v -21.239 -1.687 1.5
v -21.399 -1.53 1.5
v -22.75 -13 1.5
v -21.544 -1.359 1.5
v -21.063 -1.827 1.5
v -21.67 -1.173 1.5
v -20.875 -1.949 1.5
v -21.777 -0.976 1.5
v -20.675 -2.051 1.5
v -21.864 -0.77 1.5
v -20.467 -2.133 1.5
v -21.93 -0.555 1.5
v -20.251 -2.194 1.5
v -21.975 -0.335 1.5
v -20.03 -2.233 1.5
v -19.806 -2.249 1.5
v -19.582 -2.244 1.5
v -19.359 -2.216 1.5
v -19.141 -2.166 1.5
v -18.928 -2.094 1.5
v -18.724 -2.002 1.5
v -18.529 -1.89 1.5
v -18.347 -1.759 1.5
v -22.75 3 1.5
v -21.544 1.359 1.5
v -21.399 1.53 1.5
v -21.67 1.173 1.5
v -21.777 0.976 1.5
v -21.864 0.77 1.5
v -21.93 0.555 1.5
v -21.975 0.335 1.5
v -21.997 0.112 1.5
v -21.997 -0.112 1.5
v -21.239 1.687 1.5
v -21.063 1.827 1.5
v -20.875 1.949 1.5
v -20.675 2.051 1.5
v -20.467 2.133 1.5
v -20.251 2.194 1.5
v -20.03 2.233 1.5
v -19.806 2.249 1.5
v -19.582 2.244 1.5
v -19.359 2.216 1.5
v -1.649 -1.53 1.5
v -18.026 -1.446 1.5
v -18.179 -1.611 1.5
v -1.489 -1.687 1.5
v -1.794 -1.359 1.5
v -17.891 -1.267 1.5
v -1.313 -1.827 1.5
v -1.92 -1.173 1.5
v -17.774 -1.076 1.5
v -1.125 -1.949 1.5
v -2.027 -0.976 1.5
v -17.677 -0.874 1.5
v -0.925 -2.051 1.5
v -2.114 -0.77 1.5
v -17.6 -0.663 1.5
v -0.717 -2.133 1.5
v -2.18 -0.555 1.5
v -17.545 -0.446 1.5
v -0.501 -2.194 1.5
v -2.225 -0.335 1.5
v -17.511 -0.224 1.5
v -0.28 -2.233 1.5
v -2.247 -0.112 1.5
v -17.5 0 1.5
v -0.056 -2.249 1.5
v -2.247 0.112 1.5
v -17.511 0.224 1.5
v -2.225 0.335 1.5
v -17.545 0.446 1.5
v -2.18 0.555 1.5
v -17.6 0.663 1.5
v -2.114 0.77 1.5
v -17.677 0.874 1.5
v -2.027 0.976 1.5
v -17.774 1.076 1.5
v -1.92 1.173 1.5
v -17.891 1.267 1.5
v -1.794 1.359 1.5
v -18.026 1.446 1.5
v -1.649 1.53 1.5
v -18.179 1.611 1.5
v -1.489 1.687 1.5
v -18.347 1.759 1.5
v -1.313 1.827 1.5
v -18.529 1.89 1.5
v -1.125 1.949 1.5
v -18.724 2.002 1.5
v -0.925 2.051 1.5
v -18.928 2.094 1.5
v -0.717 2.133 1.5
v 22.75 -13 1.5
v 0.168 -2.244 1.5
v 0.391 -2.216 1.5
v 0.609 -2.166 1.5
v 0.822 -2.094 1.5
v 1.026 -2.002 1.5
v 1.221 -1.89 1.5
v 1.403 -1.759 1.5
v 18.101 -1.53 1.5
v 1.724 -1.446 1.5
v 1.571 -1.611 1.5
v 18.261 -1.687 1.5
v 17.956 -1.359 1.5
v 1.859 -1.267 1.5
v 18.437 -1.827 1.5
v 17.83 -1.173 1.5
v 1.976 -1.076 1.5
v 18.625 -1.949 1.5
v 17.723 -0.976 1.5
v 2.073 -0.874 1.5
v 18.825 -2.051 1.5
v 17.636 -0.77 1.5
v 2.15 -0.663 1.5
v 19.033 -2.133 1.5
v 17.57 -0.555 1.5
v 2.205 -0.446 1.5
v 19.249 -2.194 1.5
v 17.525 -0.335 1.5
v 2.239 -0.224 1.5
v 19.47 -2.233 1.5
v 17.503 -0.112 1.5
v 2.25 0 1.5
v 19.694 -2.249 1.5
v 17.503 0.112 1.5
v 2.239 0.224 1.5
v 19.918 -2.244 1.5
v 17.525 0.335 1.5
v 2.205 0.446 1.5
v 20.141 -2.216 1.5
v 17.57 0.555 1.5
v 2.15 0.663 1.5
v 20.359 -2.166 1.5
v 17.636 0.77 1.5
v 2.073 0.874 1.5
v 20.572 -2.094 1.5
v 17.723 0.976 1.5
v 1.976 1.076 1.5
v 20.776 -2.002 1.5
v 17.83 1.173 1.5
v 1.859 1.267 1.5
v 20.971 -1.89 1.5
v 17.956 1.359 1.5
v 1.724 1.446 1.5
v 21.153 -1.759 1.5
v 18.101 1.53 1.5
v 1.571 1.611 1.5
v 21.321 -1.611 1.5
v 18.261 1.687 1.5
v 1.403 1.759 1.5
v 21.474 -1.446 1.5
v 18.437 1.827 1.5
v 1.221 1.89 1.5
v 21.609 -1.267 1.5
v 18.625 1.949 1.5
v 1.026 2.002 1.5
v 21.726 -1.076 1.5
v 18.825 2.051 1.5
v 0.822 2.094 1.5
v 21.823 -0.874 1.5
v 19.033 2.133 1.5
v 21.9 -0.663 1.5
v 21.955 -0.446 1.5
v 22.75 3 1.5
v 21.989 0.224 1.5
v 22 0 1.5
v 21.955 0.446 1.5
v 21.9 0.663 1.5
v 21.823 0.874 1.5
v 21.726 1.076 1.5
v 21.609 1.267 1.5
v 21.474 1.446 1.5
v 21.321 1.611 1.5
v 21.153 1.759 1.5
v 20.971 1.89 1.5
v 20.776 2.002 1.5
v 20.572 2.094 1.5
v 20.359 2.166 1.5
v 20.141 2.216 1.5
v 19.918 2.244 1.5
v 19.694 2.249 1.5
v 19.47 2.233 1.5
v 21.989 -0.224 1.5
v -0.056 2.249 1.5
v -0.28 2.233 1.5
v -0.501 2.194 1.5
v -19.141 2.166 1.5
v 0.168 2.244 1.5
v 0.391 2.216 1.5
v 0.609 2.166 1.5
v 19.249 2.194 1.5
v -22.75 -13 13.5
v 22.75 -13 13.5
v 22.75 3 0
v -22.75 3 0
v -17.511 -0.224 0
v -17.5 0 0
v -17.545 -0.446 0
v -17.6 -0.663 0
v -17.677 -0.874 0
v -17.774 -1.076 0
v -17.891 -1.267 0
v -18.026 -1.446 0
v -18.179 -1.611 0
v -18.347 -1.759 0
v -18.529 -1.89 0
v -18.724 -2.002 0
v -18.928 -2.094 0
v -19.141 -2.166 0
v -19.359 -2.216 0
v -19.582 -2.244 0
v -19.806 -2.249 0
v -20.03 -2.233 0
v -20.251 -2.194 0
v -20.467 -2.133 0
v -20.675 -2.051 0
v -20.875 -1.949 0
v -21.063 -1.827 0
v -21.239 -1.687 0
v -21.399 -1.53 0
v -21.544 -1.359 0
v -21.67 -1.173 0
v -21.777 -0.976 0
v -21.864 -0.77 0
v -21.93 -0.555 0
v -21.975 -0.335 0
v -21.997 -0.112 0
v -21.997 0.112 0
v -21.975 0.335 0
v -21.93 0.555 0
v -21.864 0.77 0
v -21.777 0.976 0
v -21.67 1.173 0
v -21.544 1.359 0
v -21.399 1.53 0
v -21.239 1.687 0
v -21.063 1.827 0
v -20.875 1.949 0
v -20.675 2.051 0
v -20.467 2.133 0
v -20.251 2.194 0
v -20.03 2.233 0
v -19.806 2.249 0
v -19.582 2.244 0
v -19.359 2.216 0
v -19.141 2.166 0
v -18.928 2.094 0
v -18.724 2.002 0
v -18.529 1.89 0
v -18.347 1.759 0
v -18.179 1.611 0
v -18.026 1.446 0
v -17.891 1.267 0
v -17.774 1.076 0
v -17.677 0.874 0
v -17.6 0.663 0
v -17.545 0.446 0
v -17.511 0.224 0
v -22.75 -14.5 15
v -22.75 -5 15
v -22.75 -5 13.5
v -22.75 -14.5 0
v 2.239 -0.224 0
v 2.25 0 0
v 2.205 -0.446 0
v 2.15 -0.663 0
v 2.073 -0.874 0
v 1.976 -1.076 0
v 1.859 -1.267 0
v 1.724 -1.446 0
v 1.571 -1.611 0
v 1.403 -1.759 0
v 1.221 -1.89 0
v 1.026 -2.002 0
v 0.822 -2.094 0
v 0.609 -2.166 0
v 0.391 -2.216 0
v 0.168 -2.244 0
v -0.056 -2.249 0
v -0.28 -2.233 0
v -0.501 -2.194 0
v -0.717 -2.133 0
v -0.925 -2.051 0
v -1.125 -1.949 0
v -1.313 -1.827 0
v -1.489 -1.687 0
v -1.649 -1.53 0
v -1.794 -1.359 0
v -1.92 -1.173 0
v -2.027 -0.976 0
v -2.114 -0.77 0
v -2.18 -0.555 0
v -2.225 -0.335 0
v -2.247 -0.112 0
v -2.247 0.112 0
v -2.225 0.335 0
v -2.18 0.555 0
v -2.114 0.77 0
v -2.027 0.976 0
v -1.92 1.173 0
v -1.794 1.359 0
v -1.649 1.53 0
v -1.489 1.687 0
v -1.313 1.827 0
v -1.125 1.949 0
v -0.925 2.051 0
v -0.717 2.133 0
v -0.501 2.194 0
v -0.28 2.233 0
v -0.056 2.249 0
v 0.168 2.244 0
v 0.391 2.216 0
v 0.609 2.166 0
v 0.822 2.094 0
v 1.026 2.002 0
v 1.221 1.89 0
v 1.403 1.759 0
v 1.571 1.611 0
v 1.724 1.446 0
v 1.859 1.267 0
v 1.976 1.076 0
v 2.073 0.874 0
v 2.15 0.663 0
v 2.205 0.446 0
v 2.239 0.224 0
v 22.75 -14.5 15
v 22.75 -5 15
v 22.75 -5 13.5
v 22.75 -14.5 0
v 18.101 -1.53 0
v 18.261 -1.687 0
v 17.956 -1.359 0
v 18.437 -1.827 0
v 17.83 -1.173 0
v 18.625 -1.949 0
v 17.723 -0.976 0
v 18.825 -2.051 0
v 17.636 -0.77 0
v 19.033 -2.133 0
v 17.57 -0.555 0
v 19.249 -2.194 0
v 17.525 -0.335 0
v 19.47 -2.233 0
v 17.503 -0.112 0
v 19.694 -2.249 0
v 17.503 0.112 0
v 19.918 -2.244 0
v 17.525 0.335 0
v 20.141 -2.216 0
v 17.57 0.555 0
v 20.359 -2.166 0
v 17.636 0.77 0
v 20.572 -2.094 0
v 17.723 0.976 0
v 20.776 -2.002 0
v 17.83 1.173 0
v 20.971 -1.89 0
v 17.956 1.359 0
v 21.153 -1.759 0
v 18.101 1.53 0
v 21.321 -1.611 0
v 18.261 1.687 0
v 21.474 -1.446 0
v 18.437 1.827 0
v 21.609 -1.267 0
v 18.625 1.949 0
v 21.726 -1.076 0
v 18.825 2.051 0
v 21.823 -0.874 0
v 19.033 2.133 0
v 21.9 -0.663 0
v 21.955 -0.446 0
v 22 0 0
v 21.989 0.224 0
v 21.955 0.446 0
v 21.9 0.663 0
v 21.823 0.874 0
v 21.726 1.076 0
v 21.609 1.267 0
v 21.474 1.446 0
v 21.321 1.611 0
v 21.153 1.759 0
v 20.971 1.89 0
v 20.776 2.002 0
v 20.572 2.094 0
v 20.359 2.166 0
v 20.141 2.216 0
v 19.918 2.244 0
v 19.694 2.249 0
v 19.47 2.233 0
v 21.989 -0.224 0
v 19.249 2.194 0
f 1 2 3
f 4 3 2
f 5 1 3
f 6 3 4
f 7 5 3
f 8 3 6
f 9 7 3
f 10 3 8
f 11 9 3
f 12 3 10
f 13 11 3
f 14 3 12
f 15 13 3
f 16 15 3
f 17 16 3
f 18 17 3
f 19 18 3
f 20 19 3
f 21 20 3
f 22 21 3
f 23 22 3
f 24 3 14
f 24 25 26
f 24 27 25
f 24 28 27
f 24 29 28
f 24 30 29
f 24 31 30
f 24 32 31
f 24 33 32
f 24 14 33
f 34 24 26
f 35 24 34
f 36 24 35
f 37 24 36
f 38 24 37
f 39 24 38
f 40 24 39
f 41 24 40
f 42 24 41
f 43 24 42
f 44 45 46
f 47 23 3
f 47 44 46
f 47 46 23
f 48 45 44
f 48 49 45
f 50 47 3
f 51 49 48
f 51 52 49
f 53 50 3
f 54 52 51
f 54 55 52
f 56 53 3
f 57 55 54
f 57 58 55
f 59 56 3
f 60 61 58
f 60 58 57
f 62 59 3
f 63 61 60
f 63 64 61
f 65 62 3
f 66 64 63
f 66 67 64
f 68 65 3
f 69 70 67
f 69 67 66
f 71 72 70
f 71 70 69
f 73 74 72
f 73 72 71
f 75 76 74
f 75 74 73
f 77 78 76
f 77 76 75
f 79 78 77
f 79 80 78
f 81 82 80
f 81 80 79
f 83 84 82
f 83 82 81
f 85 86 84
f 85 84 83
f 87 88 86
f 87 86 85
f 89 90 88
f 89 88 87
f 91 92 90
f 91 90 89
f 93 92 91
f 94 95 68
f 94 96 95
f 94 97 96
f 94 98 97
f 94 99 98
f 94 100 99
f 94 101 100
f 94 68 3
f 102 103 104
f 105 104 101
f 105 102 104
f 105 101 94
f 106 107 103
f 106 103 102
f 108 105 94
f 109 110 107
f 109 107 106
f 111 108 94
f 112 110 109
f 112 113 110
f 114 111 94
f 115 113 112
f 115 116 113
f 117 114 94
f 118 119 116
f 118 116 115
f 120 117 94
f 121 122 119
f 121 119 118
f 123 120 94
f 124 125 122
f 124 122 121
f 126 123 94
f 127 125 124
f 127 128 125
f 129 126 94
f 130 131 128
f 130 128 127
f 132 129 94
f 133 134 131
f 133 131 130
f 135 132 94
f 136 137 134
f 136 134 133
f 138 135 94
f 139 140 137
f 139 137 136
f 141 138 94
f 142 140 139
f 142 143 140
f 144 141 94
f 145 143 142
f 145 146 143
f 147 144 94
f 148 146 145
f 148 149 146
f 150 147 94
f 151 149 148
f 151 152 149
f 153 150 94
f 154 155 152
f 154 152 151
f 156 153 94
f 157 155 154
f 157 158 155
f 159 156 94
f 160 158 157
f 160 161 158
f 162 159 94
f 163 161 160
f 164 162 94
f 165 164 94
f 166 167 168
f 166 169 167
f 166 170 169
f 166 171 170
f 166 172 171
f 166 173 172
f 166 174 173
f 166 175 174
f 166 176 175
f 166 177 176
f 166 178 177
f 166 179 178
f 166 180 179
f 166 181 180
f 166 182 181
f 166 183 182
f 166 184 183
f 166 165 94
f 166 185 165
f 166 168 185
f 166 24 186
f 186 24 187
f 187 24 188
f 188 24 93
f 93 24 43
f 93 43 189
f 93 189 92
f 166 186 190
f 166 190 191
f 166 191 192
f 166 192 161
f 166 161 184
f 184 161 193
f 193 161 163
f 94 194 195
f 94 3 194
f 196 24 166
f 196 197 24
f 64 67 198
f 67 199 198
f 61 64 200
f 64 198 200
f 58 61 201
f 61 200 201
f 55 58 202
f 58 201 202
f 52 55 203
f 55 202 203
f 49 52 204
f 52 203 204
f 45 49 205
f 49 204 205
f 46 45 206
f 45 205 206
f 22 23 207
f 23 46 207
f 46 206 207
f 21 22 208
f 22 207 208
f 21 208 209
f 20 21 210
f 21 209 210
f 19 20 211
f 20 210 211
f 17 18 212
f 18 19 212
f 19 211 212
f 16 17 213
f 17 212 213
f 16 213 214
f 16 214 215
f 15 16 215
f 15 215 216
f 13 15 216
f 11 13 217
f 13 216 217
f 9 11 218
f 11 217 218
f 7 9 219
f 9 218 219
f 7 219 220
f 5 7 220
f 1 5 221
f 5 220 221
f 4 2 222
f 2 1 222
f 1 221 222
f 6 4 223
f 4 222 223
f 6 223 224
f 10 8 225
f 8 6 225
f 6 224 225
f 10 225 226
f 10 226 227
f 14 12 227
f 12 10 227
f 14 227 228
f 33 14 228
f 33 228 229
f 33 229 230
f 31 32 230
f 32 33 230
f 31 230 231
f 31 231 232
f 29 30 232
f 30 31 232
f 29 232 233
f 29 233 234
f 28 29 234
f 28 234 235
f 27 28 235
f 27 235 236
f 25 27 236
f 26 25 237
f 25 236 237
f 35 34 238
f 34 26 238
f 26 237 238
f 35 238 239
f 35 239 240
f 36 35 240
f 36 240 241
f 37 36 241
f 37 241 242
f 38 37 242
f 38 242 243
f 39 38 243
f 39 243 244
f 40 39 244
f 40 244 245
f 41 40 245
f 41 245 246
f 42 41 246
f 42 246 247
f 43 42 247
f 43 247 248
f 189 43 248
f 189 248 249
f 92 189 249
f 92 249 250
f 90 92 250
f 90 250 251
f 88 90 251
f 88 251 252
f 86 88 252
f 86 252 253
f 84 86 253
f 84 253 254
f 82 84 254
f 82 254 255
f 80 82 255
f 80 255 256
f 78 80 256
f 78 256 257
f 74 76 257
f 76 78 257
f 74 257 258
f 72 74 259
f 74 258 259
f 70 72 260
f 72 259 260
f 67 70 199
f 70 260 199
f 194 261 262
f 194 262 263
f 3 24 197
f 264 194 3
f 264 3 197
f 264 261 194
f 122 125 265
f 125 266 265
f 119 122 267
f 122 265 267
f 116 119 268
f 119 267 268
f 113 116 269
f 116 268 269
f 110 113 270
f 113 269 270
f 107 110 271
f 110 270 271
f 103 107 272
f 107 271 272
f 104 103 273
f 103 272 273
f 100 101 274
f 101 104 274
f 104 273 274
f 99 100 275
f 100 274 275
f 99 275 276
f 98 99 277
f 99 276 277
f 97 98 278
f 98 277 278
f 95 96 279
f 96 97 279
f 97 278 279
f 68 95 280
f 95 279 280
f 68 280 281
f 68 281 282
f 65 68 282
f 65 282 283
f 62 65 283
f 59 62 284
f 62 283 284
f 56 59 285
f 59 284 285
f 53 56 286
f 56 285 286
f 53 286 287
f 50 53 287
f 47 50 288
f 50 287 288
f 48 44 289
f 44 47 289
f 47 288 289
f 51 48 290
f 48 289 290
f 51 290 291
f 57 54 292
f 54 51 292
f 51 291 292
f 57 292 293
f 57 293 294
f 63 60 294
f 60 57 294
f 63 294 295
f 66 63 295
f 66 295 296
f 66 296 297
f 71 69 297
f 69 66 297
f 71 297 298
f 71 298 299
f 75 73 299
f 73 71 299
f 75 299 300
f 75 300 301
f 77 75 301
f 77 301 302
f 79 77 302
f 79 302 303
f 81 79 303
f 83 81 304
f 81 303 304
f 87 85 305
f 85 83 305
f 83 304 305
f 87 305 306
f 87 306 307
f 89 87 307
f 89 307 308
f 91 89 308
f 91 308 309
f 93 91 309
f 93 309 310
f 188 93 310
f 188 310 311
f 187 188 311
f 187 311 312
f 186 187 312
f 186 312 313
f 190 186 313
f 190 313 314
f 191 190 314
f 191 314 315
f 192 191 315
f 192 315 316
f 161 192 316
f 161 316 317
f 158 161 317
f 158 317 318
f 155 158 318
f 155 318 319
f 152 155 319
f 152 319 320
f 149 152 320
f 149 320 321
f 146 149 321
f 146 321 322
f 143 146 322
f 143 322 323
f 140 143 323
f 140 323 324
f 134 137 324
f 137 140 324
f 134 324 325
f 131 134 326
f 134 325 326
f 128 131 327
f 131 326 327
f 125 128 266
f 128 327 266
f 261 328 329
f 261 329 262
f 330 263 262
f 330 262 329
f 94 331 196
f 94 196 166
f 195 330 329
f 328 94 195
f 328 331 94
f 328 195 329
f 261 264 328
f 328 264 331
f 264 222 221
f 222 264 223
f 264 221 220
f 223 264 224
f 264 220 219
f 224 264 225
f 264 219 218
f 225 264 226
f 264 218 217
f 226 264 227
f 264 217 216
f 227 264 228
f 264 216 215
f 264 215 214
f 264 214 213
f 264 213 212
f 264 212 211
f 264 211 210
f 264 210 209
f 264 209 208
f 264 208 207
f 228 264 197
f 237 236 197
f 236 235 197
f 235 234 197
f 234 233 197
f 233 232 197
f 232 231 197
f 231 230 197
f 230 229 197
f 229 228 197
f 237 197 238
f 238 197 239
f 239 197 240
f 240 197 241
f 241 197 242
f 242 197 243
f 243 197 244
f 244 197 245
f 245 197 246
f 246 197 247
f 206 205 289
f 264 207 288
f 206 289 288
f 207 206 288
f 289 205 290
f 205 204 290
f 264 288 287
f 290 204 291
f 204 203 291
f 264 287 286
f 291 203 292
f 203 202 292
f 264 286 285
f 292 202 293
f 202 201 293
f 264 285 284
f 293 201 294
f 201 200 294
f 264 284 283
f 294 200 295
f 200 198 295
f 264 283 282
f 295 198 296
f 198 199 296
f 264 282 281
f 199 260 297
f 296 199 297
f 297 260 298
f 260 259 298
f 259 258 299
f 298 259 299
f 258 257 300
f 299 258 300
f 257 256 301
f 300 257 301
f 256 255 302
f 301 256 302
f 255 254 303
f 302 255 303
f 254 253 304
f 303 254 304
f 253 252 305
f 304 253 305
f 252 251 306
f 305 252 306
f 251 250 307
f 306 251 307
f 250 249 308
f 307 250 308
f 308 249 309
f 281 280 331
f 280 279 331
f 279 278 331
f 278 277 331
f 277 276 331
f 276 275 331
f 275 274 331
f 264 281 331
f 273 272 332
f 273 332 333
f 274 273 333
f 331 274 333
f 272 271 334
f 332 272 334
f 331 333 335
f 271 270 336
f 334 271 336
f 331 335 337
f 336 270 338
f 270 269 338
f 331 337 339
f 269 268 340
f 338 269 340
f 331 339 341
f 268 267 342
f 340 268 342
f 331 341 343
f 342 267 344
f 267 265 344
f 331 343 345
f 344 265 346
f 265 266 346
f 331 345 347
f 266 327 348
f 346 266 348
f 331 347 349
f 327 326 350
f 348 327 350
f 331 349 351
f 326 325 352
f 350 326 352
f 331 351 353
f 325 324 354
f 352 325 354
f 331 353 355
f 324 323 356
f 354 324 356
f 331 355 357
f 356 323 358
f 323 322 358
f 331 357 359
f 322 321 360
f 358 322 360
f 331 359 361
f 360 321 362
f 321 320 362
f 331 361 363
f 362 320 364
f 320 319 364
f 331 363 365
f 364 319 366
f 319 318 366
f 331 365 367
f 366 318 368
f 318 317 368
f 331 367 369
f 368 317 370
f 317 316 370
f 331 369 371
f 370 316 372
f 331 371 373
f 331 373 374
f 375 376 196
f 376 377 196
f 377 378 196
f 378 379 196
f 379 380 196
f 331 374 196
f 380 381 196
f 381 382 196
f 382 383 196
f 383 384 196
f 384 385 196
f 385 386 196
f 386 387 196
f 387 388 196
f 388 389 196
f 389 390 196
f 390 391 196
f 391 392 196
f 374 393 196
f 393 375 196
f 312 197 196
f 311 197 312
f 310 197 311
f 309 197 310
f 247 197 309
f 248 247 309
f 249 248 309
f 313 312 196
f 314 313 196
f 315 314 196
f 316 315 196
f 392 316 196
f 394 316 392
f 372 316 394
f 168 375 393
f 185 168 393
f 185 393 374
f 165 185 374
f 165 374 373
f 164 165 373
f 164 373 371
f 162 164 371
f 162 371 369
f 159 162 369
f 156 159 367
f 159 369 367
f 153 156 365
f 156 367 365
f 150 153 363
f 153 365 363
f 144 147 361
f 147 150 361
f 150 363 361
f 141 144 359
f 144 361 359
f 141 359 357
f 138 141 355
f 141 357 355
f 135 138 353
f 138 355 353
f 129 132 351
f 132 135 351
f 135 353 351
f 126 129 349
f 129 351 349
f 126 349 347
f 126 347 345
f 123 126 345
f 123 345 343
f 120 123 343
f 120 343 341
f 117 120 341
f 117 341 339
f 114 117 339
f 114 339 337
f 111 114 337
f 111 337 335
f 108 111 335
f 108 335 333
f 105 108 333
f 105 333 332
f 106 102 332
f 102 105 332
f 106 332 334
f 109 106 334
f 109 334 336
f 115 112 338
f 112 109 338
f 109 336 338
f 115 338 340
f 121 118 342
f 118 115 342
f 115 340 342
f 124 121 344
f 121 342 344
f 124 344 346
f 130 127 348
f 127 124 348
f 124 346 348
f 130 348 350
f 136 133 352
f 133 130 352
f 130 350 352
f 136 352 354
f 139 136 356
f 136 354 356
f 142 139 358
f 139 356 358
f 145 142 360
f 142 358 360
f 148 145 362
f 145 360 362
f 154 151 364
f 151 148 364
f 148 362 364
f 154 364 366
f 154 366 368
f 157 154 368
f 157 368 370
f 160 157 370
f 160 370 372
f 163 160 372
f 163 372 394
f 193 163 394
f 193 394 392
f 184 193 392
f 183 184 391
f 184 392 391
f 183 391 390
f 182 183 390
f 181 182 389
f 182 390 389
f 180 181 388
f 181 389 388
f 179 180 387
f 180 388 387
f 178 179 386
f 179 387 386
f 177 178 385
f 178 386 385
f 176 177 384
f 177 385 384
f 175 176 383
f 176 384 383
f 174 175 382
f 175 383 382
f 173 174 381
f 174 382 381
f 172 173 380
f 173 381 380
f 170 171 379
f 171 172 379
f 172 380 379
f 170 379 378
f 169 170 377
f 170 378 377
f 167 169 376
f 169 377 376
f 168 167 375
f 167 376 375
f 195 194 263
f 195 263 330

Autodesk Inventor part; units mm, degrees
ref_plane "YZ Plane" through (0, 0, 0) normal (1, 0, 0) x (0, 1, 0)
ref_plane "XZ Plane" through (0, 0, 0) normal (0, 1, 0) x (-1, 0, 0)
ref_plane "XY Plane" through (0, 0, 0) normal (0, 0, 1) x (1, 0, 0)
sketch "Sketch1" plane through (0, 0, 0) normal (0, 0, 1) x (1, 0, 0)
  circle A0 centre (0, 0) radius 2.25
  circle A1 centre (-19.75, 0) radius 2.25
  circle A2 centre (19.75, 0) radius 2.25
  line L0 (0, 13.6364) -> (0, -14.2241) construction
  line L1 (-36.2718, 0) -> (35.3009, 0) construction
  line L2 (-22.75, 3) -> (22.75, 3)
  line L3 (22.75, 3) -> (22.75, -3)
  line L4 (22.75, -3) -> (-22.75, -3)
  line L5 (-22.75, -3) -> (-22.75, 3)
  line L6 (-22.75, -3) -> (22.75, -3)
  line L7 (22.75, -3) -> (22.75, -13)
  line L8 (22.75, -13) -> (-22.75, -13)
  line L9 (-22.75, -13) -> (-22.75, -3)
  line L10 (-22.75, -13) -> (22.75, -13)
  line L11 (22.75, -13) -> (22.75, -14.5)
  line L12 (22.75, -14.5) -> (-22.75, -14.5)
  line L13 (-22.75, -14.5) -> (-22.75, -13)
  dimension "d0" = 4.5
  dimension "d1" = 4.5
  dimension "d2" = 4.5
  dimension "d5" = 3
  dimension "d6" = 3
  dimension "d7" = 3
  dimension "d8" = 3
  dimension "d9" = 10
  dimension "d10" = 1.5
  dimension "d20" = 22
  dimension "d21" = 22
extrude "Extrusion1" add sketch "Sketch1" along normal blind 1.5
extrude "Extrusion2" add sketch "Sketch1" along normal blind 13.5 contours L8 L11 L12 L13
sketch "Sketch2" plane through (-22.75, -13, 1.5) normal (0, 1, 0) x (1, 0, 0)
  line L0 (45.5, 0) -> (45.5, -12) projected
  line L1 (0, -12) -> (45.5, -12)
  line L2 (45.5, -12) -> (45.5, -13.5)
  line L3 (45.5, -13.5) -> (0, -13.5)
  line L4 (0, -13.5) -> (0, -12)
  point P0 (22.75, 1.5)
  dimension "d15" = 1.5
extrude "Extrusion3" add sketch "Sketch2" against normal blind 1.5
extrude "Extrusion4" add sketch "Sketch2" along normal blind 8
properties part number "TopClip"
